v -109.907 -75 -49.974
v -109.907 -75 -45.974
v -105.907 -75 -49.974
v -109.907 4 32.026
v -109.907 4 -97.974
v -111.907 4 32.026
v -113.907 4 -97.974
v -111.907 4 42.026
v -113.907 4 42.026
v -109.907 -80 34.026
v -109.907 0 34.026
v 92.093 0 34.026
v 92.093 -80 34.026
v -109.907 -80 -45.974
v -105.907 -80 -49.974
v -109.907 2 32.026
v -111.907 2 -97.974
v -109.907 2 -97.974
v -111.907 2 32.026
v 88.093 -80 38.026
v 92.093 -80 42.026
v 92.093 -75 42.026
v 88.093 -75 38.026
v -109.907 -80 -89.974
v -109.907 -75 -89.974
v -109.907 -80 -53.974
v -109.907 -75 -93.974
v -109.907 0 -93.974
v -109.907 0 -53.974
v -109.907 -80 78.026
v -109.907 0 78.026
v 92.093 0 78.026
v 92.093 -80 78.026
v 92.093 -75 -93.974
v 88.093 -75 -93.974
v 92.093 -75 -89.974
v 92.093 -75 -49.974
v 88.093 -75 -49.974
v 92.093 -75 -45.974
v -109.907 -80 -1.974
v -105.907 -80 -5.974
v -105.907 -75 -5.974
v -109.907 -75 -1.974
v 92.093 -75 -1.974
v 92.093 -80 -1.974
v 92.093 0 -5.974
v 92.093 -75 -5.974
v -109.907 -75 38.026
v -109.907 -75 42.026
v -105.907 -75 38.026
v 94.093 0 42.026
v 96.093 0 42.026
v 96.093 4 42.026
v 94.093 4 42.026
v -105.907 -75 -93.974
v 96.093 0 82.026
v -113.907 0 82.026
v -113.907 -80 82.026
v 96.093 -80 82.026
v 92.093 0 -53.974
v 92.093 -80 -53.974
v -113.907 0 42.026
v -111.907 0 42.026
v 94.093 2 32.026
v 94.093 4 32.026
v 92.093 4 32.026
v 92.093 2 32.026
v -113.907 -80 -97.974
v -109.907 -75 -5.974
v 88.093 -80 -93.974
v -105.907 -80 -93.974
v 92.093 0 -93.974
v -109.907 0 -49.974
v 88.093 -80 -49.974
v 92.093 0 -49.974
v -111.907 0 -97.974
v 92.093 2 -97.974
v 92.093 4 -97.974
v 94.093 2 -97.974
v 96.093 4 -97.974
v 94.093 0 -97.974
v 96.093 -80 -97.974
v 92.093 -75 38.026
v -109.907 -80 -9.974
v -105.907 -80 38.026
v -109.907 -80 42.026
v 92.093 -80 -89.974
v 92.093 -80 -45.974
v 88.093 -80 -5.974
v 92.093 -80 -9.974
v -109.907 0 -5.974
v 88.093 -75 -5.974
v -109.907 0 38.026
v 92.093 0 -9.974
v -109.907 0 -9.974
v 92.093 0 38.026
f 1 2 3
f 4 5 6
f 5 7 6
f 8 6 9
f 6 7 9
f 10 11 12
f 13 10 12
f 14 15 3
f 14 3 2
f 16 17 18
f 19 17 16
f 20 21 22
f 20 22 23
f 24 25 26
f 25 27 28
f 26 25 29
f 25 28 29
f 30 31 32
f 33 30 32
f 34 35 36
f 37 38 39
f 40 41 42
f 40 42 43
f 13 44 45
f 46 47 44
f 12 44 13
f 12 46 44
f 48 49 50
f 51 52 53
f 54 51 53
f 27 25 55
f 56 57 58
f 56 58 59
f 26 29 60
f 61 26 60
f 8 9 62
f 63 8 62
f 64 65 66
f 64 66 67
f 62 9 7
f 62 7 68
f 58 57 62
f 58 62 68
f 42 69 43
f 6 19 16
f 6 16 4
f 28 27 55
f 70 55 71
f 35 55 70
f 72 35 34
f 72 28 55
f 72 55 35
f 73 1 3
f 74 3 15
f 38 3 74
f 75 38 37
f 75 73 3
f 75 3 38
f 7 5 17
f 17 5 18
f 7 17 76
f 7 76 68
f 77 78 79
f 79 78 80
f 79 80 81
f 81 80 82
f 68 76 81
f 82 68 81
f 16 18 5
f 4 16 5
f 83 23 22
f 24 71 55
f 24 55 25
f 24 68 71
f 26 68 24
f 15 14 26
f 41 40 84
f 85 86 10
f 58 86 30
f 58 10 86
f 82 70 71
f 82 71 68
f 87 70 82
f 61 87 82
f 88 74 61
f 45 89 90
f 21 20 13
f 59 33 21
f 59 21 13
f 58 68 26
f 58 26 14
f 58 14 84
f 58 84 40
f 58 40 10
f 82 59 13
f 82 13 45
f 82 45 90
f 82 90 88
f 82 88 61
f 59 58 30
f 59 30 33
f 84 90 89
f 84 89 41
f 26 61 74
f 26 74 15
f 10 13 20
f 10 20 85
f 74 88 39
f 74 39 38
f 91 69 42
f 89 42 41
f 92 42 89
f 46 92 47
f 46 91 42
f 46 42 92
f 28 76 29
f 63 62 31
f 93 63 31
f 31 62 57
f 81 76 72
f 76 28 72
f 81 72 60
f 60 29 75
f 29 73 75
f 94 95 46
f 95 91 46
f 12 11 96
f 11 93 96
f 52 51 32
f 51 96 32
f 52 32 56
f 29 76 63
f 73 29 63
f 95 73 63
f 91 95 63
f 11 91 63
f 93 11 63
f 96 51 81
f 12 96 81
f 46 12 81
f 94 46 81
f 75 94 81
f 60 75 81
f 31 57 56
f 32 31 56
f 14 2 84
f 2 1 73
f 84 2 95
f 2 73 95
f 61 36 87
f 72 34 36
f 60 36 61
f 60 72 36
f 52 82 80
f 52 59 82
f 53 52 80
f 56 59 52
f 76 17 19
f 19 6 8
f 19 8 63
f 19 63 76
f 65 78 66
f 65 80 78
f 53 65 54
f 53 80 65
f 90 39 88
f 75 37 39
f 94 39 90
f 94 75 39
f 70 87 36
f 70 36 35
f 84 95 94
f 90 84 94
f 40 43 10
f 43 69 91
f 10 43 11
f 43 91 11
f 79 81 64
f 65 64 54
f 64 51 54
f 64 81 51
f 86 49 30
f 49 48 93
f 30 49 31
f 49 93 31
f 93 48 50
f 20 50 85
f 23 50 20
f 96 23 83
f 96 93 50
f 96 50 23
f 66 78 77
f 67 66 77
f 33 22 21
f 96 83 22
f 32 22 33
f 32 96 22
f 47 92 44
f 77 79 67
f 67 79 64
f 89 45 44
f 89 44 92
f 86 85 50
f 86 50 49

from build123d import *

# Parameters (mm, degrees)
F0_W      = 210
F0_H      = 180
F0_W_2    = 202
F0_H_2    = 40
F1_DEPTH  = 80
F2_W      = 4
F2_H      = 140
F3_DEPTH  = 2
F4_W      = 4
F4_H      = 140
F5_DEPTH  = 2
F6_W      = 2
F6_H      = 130
F7_DEPTH  = 2
F8_W      = 2
F8_H      = 130
F9_DEPTH  = 2
F11_DEPTH = 5


with BuildPart() as f1:
    # F0 (on Front) → F1 (new body)
    with BuildSketch(Plane.XZ):
        with Locations((-8.9074341967, -7.9735703766)):
            Rectangle(F0_W, F0_H)
        with Locations((-8.9074341967, -73.9735703766)):
            Rectangle(F0_W_2, F0_H_2, mode=Mode.SUBTRACT)
        with Locations((-8.9074341967, -29.9735703766)):
            Rectangle(F0_W_2, F0_H_2, mode=Mode.SUBTRACT)
        with Locations((-8.9074341967, 14.0264296234)):
            Rectangle(F0_W_2, F0_H_2, mode=Mode.SUBTRACT)
        with Locations((-8.9074341967, 58.0264296234)):
            Rectangle(F0_W_2, F0_H_2, mode=Mode.SUBTRACT)
    extrude(amount=F1_DEPTH)

    # F2 (on face) → F3 (join)
    with BuildSketch(Plane.YZ.offset(96.0925658033)):
        with Locations((2, -27.9735703766)):
            Rectangle(F2_W, F2_H)
    extrude(amount=-F3_DEPTH)

    # F4 (on face) → F5 (join)
    with BuildSketch(Plane(origin=(-113.9074341967, 0, 0), x_dir=(0, -1, 0), z_dir=(-1, 0, 0))):
        with Locations((-2, -27.9735703766)):
            Rectangle(F4_W, F4_H)
    extrude(amount=-F5_DEPTH)

    # F6 (on face) → F7 (join)
    with BuildSketch(Plane.YZ.offset(-111.9074341967)):
        with Locations((3, -32.9735703766)):
            Rectangle(F6_W, F6_H)
    extrude(amount=F7_DEPTH)

    # F8 (on face) → F9 (join)
    with BuildSketch(Plane(origin=(94.0925658033, 0, 0), x_dir=(0, -1, 0), z_dir=(-1, 0, 0))):
        with Locations((-3, -32.9735703766)):
            Rectangle(F8_W, F8_H)
    extrude(amount=F9_DEPTH)

    # F10 (on face) → F11 (join)
    with BuildSketch(Plane.XZ.offset(80)):
        Polygon((-109.9074341967, -45.9735703766), (-109.9074341967, -49.9735703766), (-105.9074341967, -49.9735703766), align=None)
        Polygon((-109.9074341967, -89.9735703766), (-109.9074341967, -93.9735703766), (-105.9074341967, -93.9735703766), align=None)
        Polygon((92.0925658033, -89.9735703766), (88.0925658033, -93.9735703766), (92.0925658033, -93.9735703766), align=None)
        Polygon((92.0925658033, -45.9735703766), (88.0925658033, -49.9735703766), (92.0925658033, -49.9735703766), align=None)
        Polygon((-109.9074341967, -1.9735703766), (-109.9074341967, -5.9735703766), (-105.9074341967, -5.9735703766), align=None)
        Polygon((92.0925658033, -1.9735703766), (88.0925658033, -5.9735703766), (92.0925658033, -5.9735703766), align=None)
        Polygon((92.0925658033, 42.0264296234), (88.0925658033, 38.0264296234), (92.0925658033, 38.0264296234), align=None)
        Polygon((-109.9074341967, 42.0264296234), (-109.9074341967, 38.0264296234), (-105.9074341967, 38.0264296234), align=None)
    extrude(amount=-F11_DEPTH)


solid = f1.part
